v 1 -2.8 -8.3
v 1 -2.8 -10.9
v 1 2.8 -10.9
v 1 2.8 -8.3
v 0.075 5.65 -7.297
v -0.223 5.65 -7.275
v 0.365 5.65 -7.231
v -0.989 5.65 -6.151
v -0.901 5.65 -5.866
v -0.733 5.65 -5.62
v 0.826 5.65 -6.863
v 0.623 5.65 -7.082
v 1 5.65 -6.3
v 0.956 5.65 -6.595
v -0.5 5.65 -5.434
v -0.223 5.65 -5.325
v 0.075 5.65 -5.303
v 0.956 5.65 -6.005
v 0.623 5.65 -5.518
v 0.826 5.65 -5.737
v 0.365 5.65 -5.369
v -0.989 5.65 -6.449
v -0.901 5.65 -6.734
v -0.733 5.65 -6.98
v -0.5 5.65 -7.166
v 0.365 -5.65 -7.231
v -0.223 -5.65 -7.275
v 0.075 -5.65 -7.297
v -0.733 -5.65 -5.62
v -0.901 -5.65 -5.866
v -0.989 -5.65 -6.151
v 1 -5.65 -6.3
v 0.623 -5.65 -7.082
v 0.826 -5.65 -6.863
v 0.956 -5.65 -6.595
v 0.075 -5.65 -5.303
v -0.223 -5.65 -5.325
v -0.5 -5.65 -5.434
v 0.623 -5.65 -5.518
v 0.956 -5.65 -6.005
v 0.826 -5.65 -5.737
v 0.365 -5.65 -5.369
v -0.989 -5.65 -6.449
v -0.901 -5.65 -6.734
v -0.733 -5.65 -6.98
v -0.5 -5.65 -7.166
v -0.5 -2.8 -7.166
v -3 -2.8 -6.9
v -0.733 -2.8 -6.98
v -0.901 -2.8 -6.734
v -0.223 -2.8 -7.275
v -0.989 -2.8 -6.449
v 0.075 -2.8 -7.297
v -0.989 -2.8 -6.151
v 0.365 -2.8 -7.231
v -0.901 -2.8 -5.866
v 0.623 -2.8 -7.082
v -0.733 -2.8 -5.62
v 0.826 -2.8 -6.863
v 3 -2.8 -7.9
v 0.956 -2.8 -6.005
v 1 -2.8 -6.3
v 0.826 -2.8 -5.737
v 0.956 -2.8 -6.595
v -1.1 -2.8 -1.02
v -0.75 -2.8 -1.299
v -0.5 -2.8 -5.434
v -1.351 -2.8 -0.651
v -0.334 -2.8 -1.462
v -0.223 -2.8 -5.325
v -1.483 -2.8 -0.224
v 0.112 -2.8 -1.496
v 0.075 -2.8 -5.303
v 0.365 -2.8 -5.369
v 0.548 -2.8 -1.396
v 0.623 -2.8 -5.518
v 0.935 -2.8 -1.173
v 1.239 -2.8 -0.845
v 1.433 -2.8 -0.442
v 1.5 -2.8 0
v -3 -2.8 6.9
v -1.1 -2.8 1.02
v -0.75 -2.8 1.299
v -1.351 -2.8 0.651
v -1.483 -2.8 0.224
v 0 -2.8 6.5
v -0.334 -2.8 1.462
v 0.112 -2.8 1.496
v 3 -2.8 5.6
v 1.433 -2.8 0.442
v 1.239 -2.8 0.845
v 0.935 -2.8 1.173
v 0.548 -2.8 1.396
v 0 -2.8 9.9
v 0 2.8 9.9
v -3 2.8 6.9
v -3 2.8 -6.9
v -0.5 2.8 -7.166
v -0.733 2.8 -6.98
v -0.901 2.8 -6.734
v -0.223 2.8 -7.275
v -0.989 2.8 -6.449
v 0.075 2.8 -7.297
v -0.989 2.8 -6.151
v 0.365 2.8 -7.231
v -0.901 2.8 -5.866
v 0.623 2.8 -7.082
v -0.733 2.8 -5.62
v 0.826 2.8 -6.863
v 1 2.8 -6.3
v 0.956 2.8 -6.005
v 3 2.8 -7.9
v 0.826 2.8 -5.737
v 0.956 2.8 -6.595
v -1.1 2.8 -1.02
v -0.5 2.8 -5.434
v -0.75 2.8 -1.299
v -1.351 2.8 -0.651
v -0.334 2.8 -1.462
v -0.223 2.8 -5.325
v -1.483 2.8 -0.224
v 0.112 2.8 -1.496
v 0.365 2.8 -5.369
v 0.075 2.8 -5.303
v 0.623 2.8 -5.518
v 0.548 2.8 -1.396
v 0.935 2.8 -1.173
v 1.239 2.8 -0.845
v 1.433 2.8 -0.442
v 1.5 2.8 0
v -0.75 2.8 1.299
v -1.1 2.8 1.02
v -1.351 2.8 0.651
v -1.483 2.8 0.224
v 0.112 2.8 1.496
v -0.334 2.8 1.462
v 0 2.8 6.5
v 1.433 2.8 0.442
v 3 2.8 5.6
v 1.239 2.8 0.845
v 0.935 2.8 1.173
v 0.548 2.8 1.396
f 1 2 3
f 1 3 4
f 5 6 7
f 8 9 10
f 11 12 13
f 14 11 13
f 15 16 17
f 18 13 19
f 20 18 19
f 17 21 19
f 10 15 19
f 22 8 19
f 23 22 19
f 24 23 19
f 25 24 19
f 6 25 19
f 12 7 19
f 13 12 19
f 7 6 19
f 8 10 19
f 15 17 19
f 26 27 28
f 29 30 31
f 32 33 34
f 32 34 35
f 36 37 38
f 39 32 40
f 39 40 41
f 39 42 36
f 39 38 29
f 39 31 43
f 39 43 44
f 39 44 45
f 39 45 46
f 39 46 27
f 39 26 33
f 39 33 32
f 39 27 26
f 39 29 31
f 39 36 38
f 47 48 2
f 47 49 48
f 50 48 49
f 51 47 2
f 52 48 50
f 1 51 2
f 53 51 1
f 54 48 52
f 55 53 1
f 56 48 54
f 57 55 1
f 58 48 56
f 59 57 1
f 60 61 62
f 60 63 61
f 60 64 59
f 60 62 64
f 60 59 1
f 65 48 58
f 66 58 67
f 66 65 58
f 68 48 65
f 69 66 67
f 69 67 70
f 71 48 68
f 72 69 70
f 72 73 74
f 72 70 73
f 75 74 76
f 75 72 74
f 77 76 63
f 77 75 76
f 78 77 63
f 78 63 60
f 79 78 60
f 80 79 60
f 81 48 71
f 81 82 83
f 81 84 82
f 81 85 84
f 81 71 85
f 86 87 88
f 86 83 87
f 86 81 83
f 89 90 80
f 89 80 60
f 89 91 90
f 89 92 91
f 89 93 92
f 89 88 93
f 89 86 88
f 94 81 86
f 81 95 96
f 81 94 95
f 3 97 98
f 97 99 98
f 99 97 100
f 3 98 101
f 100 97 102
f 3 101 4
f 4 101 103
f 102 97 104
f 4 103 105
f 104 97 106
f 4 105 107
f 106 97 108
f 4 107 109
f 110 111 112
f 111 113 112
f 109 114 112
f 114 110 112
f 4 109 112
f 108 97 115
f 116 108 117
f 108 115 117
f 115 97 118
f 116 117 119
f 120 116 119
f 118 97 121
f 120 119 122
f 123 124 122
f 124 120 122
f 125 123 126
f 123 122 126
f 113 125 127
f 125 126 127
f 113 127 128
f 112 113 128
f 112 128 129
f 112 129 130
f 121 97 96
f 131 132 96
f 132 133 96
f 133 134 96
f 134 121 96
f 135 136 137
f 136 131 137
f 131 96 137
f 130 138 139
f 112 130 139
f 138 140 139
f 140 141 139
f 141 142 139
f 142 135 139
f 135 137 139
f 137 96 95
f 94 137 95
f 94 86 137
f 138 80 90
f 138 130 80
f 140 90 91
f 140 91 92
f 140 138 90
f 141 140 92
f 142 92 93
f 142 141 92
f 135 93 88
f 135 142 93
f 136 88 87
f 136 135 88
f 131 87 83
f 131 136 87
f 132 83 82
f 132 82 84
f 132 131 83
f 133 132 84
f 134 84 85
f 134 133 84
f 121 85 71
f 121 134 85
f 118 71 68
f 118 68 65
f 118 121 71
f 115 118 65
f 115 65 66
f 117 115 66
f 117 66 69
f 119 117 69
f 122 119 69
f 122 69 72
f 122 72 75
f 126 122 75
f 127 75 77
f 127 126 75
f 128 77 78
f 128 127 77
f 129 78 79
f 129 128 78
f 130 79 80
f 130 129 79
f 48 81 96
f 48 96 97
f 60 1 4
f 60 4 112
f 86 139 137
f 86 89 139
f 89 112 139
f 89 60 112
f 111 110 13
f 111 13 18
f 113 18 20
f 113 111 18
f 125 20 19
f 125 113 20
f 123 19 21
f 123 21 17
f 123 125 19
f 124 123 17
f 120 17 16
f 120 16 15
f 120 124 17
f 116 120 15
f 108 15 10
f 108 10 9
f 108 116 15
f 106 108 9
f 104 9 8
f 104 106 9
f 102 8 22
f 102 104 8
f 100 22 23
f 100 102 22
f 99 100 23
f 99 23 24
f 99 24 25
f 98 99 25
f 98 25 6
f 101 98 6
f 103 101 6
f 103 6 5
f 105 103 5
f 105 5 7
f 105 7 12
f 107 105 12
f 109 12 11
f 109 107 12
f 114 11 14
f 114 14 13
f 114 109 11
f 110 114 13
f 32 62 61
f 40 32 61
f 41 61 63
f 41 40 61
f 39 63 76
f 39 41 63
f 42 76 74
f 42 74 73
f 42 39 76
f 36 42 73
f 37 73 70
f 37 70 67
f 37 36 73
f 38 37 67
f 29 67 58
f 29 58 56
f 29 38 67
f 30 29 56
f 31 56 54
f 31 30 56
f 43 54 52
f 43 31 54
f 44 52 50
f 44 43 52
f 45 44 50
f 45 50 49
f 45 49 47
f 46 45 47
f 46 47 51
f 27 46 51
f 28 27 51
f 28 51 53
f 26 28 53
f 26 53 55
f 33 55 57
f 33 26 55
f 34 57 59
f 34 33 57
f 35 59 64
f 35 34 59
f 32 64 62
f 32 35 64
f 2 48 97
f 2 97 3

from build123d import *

# Parameters (mm, degrees)
F0_R     = 1
F0_R_2   = 1.5
F1_DEPTH = 2.8
F2_DEPTH = 5.65


with BuildPart() as f1:
    # F0 (on Front) → F1 (new body, symmetric)
    with BuildSketch(Plane.XZ):
        Polygon((0, 9.9), (-3, 6.9), (-3, -6.9), (1, -10.9), (1, -8.3), (3, -7.9), (3, 5.6), (0, 6.5), align=None)
        with Locations((0, -6.3)):
            Circle(F0_R, mode=Mode.SUBTRACT)
        Circle(F0_R_2, mode=Mode.SUBTRACT)
    extrude(amount=F1_DEPTH, both=True)

    # F0 (on Front) → F2 (join, symmetric)
    with BuildSketch(Plane.XZ):
        with Locations((0, -6.3)):
            Circle(F0_R)
    extrude(amount=F2_DEPTH, both=True)


solid = f1.part
